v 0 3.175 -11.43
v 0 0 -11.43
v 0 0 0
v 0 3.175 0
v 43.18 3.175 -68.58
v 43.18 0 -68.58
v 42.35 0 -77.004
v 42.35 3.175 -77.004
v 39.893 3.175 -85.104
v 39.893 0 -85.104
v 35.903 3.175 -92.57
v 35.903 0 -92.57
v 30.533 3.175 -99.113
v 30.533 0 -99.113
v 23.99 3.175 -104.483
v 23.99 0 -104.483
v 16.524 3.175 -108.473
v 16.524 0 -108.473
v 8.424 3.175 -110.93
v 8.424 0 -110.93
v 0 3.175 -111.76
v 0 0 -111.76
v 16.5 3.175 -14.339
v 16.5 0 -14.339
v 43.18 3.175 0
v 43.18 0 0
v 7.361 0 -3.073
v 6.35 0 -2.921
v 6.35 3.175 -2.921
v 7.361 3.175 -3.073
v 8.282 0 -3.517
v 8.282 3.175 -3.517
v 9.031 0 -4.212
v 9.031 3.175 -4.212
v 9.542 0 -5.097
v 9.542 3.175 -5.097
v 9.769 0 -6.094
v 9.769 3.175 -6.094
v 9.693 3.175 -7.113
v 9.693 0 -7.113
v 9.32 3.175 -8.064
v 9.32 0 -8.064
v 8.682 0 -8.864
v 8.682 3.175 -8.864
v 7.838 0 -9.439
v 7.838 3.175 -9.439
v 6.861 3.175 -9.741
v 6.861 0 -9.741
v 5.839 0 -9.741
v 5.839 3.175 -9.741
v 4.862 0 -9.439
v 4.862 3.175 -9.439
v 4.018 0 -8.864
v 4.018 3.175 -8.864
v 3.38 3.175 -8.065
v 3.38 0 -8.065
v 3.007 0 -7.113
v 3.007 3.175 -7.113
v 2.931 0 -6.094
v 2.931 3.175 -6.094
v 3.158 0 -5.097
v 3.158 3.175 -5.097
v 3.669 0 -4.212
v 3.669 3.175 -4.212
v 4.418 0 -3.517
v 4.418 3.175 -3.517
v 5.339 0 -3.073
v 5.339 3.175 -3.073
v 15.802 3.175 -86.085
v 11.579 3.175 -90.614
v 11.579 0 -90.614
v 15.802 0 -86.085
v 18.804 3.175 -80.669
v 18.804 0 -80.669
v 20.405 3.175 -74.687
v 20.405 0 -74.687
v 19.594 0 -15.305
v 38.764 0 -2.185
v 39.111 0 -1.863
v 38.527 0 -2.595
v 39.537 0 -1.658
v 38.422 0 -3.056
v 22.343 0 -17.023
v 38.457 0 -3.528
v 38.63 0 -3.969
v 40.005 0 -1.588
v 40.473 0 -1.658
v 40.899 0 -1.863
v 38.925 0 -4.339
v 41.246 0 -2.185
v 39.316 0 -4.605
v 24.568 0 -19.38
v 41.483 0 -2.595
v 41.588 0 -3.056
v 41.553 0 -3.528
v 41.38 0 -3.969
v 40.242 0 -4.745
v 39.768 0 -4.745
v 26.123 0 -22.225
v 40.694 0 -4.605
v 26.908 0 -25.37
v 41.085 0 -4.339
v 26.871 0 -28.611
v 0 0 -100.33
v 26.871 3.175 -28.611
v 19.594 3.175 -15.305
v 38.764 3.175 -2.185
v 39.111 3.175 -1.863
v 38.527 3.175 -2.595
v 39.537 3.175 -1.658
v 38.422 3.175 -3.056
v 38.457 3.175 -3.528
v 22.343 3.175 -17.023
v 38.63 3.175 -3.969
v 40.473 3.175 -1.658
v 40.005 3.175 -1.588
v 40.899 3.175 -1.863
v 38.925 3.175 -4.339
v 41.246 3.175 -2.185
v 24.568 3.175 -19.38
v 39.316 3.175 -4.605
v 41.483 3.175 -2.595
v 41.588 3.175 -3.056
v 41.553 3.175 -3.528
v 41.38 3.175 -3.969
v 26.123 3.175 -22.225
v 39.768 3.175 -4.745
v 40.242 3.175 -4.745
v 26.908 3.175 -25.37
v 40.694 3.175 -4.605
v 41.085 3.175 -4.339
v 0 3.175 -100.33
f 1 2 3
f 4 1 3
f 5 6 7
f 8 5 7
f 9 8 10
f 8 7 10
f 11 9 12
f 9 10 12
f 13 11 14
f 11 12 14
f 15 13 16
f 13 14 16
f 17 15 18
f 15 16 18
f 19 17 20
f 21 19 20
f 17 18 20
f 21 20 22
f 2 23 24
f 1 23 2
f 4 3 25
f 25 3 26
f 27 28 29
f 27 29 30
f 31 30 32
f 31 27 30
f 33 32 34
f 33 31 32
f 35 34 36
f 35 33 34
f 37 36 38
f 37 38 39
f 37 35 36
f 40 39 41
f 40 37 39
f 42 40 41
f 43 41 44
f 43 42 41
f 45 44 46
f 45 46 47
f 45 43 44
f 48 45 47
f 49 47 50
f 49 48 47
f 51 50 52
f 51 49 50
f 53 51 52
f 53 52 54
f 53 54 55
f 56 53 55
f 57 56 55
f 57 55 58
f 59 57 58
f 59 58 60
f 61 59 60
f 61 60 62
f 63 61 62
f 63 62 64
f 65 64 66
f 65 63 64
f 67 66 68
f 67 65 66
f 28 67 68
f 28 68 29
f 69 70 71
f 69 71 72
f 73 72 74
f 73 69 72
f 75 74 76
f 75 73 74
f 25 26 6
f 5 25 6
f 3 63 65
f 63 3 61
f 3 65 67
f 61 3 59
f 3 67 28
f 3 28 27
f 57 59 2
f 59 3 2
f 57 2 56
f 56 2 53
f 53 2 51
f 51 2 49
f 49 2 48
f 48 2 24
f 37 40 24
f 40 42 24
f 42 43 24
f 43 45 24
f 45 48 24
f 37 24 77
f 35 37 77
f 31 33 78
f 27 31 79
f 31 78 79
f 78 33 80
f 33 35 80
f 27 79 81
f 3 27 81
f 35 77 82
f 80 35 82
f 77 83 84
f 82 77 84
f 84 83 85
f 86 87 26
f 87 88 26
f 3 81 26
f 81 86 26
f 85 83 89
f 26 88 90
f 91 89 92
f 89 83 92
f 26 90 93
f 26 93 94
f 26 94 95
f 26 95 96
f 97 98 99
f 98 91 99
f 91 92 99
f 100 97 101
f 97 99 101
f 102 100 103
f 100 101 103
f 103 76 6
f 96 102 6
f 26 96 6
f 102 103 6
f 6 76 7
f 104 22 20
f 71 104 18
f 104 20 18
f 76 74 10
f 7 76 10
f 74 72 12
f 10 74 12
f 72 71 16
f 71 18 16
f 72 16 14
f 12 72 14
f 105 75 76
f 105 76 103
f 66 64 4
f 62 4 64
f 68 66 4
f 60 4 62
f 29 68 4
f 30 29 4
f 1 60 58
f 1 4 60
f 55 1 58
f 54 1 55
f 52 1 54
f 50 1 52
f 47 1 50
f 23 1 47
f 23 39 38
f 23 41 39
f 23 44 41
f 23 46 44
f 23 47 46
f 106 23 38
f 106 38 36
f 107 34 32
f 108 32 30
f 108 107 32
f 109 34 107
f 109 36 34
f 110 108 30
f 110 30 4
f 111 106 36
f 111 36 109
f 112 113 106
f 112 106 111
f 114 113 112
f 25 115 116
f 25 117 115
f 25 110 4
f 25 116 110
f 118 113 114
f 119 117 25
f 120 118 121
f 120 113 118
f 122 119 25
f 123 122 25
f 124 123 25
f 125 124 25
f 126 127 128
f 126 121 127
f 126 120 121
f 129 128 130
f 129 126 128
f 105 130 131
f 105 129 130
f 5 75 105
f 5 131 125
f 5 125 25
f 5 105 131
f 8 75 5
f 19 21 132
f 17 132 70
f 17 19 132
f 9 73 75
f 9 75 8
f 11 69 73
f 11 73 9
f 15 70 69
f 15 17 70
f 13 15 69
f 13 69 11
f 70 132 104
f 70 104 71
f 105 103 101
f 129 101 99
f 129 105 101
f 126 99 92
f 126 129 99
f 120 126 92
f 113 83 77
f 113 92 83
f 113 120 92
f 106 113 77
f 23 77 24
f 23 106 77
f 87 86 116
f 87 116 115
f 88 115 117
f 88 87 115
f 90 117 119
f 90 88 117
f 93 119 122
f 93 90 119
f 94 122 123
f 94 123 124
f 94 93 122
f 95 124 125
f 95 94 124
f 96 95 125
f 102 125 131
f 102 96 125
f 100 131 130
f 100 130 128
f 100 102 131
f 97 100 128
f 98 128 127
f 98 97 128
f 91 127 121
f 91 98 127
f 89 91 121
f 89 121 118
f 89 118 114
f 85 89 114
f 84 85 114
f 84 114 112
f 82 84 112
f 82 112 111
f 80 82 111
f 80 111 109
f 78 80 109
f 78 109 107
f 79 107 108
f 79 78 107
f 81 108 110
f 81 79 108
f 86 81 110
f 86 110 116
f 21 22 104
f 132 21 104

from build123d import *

# Parameters (mm, degrees)
SKETCH1_R           = 3.429
SKETCH1_R_2         = 1.5875
BOSS_EXTRUDE1_DEPTH = 3.175
CUT_EXTRUDE1_DEPTH  = 120.85362166


with BuildPart() as part:
    # Sketch1 → Boss-Extrude1 (new body)
    with BuildSketch(Plane(origin=(0, 0, 0), x_dir=(1, 0, 0), z_dir=(0, 1, 0))):
        with BuildLine():
            Line((0, 0), (43.18, 0))
            Line((43.18, 0), (43.18, 68.58))
            ThreePointArc((43.18, 68.58), (30.532870812, 99.112870812), (0, 111.76))
            Line((0, 111.76), (0, 0))
        make_face()
        with Locations(Location((6.35, 6.35, 0), (0, 0, 270))):
            Circle(SKETCH1_R, mode=Mode.SUBTRACT)
        with Locations(Location((40.005, 3.175, 0), (0, 0, 270))):
            Circle(SKETCH1_R_2, mode=Mode.SUBTRACT)
    extrude(amount=BOSS_EXTRUDE1_DEPTH)

    # Sketch2 → Cut-Extrude1 (cut, through all)
    with BuildSketch(Plane(origin=(0, 3.175, 0), x_dir=(1, 0, 0), z_dir=(0, 1, 0))):
        with BuildLine():
            Line((16.499594236, 14.339323634), (0, 11.43))
            Line((0, 11.43), (0, 100.33))
            Line((0, 100.33), (11.578626407, 90.614378852))
            ThreePointArc((11.578626407, 90.614378852), (17.468445655, 83.468697719), (20.405366763, 74.686600928))
            Line((20.405366763, 74.686600928), (26.8710352, 28.611257563))
            ThreePointArc((26.8710352, 28.611257563), (24.567999732, 19.380438031), (16.499594236, 14.339323634))
        make_face()
    extrude(amount=-CUT_EXTRUDE1_DEPTH, mode=Mode.SUBTRACT)


solid = part.part
